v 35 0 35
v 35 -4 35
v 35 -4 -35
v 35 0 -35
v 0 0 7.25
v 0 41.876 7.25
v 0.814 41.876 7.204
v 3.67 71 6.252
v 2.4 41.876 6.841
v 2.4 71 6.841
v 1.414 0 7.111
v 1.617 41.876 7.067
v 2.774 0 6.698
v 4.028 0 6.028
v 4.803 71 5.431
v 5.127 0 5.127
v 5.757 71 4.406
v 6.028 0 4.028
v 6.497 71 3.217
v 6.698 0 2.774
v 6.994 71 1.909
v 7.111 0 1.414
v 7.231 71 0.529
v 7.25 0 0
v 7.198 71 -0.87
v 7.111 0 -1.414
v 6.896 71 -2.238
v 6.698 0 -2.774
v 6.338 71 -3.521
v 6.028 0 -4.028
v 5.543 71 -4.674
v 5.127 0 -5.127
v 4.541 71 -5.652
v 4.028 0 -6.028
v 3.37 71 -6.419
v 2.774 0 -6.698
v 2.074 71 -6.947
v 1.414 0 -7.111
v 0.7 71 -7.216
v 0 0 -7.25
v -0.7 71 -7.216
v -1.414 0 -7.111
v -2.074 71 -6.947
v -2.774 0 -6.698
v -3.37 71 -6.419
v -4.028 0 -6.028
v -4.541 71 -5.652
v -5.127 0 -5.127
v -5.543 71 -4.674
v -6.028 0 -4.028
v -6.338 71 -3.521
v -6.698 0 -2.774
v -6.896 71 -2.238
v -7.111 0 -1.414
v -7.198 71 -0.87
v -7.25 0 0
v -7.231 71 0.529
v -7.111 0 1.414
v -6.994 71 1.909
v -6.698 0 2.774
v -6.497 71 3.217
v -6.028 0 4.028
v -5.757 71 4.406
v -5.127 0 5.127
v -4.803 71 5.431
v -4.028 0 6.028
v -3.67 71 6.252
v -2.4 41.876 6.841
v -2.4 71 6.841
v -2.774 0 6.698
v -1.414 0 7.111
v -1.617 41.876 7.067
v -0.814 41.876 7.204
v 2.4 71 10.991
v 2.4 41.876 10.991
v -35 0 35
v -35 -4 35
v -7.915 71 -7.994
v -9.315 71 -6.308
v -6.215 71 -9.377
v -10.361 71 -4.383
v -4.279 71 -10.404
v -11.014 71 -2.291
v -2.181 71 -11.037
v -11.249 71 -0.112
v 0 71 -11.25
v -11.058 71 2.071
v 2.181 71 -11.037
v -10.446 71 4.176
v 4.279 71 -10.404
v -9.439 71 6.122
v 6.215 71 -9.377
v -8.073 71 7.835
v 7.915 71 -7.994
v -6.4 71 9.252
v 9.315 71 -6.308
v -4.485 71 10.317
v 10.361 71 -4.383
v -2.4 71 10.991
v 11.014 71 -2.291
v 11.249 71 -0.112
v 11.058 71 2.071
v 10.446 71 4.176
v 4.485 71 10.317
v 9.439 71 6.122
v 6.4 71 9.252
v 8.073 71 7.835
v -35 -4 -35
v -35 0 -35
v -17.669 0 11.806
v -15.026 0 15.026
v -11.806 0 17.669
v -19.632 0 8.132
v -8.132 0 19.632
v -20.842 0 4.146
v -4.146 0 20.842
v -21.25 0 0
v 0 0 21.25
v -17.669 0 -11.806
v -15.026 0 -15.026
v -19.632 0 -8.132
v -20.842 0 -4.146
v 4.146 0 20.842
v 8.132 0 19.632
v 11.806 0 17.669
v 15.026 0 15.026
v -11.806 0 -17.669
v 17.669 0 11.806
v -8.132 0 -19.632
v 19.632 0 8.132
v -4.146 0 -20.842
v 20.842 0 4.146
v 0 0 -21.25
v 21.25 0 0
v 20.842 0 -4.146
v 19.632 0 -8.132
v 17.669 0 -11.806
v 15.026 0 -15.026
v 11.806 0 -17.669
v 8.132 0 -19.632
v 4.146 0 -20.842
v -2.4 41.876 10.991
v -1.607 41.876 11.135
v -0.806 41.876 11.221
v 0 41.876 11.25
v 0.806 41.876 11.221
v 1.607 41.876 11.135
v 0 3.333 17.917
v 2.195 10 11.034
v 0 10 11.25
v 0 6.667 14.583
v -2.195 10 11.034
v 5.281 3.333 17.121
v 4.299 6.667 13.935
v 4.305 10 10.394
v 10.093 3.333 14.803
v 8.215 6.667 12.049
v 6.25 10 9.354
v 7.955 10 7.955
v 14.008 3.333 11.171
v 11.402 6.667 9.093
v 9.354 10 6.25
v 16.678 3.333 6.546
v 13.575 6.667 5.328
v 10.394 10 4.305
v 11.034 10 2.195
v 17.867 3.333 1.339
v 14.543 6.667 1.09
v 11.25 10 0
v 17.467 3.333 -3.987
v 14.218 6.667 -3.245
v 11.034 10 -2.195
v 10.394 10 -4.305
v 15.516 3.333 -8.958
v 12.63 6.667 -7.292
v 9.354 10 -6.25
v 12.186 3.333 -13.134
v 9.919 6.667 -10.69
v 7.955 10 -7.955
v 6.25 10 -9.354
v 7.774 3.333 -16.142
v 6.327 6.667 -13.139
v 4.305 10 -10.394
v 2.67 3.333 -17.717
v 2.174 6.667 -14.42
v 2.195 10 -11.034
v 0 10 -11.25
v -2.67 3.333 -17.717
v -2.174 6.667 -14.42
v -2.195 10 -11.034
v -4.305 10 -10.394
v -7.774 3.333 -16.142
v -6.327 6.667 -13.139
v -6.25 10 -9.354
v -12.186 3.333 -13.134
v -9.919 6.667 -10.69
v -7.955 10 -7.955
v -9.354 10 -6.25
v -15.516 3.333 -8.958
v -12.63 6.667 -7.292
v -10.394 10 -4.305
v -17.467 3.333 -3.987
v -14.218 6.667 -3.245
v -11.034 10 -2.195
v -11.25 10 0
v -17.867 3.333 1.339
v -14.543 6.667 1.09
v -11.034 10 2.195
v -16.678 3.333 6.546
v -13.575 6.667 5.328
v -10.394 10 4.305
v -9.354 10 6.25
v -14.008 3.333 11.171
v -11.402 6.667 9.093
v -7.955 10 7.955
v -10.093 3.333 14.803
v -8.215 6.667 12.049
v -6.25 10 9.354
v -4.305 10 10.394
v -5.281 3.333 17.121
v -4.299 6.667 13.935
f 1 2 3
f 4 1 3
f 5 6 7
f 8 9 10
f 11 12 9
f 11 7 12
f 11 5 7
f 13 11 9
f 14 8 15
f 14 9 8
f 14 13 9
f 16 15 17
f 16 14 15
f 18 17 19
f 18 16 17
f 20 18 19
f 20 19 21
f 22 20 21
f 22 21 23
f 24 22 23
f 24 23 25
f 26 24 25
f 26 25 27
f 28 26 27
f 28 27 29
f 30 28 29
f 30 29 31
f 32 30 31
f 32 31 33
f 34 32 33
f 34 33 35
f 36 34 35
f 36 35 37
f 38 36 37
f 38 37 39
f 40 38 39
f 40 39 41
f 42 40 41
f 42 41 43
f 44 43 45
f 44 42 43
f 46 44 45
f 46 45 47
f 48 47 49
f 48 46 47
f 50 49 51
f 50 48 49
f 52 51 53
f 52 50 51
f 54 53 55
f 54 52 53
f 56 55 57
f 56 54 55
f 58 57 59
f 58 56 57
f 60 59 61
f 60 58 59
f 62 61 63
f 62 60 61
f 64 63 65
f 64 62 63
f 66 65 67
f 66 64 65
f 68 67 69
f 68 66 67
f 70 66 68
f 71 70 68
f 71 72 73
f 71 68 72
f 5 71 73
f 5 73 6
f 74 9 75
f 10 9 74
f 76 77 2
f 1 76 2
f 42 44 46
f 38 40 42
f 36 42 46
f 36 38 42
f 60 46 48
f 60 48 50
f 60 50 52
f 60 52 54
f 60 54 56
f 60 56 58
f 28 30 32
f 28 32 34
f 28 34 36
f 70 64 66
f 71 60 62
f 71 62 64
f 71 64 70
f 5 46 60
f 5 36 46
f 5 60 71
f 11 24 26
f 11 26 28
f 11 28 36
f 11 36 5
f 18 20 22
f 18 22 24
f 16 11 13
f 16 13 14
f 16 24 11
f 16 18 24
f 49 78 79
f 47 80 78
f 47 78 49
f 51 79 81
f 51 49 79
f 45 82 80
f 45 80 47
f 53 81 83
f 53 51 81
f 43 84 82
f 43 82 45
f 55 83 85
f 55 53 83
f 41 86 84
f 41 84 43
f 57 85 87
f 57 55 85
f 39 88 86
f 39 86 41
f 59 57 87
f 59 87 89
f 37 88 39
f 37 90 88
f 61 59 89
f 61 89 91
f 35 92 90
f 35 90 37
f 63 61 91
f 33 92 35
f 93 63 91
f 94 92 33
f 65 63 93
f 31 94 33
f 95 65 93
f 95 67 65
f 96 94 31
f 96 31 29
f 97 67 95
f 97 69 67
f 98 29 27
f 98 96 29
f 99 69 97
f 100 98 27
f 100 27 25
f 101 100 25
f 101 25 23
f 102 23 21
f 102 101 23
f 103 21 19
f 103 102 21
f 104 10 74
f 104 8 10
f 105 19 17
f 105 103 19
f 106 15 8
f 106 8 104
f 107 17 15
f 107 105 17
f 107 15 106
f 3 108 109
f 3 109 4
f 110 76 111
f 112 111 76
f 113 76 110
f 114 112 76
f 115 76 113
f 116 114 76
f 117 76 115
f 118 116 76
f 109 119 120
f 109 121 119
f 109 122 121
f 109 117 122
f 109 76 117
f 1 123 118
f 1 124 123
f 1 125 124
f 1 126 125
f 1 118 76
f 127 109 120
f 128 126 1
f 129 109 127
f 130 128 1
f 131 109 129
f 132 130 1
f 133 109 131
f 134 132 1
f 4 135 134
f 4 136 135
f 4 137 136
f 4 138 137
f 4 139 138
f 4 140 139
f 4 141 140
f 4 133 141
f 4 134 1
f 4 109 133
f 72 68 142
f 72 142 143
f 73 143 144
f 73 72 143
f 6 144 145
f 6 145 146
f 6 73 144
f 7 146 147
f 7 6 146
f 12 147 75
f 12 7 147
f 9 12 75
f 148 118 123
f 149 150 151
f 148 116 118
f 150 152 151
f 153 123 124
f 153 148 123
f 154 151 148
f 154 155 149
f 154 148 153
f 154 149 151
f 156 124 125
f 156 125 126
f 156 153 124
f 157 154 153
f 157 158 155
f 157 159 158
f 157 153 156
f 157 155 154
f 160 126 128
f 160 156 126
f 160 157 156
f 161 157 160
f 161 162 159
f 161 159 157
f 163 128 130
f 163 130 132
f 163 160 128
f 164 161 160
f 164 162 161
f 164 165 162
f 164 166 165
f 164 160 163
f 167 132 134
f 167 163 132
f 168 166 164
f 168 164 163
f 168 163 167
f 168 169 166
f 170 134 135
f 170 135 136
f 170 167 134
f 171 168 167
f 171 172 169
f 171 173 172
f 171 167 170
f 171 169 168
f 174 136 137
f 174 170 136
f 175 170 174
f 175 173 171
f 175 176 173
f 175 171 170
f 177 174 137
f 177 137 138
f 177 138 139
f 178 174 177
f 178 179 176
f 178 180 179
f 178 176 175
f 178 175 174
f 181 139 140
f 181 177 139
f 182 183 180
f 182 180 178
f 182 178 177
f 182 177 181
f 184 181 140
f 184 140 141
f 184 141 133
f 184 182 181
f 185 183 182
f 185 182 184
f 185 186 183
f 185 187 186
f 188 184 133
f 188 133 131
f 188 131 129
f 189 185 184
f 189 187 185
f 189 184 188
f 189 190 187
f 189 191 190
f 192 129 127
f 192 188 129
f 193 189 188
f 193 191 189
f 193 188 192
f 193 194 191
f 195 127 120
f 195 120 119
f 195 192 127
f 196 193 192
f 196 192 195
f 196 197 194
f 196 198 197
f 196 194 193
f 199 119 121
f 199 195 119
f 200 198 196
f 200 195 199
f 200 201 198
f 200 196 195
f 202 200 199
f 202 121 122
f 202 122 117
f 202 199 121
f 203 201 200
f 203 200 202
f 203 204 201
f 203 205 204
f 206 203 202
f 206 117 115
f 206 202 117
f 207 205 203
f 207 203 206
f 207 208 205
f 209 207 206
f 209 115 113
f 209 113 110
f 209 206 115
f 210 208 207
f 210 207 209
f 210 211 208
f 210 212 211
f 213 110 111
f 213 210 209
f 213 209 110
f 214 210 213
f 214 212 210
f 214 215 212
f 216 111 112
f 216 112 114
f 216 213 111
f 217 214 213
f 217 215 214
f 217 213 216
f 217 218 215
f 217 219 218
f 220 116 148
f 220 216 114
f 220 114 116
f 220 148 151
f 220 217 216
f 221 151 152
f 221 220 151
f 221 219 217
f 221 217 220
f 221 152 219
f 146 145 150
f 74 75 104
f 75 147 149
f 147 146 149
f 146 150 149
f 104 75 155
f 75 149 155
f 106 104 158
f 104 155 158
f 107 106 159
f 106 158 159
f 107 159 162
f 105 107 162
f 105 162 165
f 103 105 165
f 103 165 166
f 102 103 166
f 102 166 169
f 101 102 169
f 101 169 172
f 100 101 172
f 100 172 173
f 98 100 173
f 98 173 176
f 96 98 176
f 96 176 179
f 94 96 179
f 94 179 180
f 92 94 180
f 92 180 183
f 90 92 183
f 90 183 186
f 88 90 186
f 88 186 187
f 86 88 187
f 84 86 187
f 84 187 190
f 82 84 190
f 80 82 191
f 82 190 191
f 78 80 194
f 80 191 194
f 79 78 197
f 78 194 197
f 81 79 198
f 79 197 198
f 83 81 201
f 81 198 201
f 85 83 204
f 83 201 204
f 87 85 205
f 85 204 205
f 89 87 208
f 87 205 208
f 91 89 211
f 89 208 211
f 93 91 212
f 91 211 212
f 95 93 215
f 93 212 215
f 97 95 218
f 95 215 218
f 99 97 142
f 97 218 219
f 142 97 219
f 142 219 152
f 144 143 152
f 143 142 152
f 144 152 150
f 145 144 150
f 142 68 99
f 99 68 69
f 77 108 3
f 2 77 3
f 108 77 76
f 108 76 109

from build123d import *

# Parameters (mm, degrees)
SKETCH2_R           = 11.25
SKETCH2_R_2         = 7.25
BOSS_EXTRUDE1_DEPTH = 71
SKETCH2_6_W         = 70
SKETCH2_6_H         = 70
BOSS_EXTRUDE2_DEPTH = 4
CHAMFER1_SIZE       = 10
SKETCH6_W           = 4.8
SKETCH6_H           = 29.123834
CUT_EXTRUDE2_DEPTH  = 25


with BuildPart() as part:
    # Sketch2 → Boss-Extrude1 (new body)
    with BuildSketch(Plane(origin=(0, 0, 0), x_dir=(1, 0, 0), z_dir=(0, 1, 0))):
        Circle(SKETCH2_R)
        Circle(SKETCH2_R_2, mode=Mode.SUBTRACT)
    extrude(amount=BOSS_EXTRUDE1_DEPTH)

    # Sketch2<6> → Boss-Extrude2 (add)
    with BuildSketch(Plane(origin=(0, 0, 0), x_dir=(1, 0, 0), z_dir=(0, 1, 0))):
        Rectangle(SKETCH2_6_W, SKETCH2_6_H)
    extrude(amount=-BOSS_EXTRUDE2_DEPTH)

    # Chamfer1
    chamfer1_edges = [part.edges().sort_by_distance(p)[0] for p in [
        (-11.25, 0, 0),
    ]]
    chamfer(chamfer1_edges, length=CHAMFER1_SIZE)

    # Sketch6 → Cut-Extrude2 (cut)
    with BuildSketch(Plane.XY):
        with Locations((0, 56.438083)):
            Rectangle(SKETCH6_W, SKETCH6_H)
    extrude(amount=CUT_EXTRUDE2_DEPTH, mode=Mode.SUBTRACT)


solid = part.part
